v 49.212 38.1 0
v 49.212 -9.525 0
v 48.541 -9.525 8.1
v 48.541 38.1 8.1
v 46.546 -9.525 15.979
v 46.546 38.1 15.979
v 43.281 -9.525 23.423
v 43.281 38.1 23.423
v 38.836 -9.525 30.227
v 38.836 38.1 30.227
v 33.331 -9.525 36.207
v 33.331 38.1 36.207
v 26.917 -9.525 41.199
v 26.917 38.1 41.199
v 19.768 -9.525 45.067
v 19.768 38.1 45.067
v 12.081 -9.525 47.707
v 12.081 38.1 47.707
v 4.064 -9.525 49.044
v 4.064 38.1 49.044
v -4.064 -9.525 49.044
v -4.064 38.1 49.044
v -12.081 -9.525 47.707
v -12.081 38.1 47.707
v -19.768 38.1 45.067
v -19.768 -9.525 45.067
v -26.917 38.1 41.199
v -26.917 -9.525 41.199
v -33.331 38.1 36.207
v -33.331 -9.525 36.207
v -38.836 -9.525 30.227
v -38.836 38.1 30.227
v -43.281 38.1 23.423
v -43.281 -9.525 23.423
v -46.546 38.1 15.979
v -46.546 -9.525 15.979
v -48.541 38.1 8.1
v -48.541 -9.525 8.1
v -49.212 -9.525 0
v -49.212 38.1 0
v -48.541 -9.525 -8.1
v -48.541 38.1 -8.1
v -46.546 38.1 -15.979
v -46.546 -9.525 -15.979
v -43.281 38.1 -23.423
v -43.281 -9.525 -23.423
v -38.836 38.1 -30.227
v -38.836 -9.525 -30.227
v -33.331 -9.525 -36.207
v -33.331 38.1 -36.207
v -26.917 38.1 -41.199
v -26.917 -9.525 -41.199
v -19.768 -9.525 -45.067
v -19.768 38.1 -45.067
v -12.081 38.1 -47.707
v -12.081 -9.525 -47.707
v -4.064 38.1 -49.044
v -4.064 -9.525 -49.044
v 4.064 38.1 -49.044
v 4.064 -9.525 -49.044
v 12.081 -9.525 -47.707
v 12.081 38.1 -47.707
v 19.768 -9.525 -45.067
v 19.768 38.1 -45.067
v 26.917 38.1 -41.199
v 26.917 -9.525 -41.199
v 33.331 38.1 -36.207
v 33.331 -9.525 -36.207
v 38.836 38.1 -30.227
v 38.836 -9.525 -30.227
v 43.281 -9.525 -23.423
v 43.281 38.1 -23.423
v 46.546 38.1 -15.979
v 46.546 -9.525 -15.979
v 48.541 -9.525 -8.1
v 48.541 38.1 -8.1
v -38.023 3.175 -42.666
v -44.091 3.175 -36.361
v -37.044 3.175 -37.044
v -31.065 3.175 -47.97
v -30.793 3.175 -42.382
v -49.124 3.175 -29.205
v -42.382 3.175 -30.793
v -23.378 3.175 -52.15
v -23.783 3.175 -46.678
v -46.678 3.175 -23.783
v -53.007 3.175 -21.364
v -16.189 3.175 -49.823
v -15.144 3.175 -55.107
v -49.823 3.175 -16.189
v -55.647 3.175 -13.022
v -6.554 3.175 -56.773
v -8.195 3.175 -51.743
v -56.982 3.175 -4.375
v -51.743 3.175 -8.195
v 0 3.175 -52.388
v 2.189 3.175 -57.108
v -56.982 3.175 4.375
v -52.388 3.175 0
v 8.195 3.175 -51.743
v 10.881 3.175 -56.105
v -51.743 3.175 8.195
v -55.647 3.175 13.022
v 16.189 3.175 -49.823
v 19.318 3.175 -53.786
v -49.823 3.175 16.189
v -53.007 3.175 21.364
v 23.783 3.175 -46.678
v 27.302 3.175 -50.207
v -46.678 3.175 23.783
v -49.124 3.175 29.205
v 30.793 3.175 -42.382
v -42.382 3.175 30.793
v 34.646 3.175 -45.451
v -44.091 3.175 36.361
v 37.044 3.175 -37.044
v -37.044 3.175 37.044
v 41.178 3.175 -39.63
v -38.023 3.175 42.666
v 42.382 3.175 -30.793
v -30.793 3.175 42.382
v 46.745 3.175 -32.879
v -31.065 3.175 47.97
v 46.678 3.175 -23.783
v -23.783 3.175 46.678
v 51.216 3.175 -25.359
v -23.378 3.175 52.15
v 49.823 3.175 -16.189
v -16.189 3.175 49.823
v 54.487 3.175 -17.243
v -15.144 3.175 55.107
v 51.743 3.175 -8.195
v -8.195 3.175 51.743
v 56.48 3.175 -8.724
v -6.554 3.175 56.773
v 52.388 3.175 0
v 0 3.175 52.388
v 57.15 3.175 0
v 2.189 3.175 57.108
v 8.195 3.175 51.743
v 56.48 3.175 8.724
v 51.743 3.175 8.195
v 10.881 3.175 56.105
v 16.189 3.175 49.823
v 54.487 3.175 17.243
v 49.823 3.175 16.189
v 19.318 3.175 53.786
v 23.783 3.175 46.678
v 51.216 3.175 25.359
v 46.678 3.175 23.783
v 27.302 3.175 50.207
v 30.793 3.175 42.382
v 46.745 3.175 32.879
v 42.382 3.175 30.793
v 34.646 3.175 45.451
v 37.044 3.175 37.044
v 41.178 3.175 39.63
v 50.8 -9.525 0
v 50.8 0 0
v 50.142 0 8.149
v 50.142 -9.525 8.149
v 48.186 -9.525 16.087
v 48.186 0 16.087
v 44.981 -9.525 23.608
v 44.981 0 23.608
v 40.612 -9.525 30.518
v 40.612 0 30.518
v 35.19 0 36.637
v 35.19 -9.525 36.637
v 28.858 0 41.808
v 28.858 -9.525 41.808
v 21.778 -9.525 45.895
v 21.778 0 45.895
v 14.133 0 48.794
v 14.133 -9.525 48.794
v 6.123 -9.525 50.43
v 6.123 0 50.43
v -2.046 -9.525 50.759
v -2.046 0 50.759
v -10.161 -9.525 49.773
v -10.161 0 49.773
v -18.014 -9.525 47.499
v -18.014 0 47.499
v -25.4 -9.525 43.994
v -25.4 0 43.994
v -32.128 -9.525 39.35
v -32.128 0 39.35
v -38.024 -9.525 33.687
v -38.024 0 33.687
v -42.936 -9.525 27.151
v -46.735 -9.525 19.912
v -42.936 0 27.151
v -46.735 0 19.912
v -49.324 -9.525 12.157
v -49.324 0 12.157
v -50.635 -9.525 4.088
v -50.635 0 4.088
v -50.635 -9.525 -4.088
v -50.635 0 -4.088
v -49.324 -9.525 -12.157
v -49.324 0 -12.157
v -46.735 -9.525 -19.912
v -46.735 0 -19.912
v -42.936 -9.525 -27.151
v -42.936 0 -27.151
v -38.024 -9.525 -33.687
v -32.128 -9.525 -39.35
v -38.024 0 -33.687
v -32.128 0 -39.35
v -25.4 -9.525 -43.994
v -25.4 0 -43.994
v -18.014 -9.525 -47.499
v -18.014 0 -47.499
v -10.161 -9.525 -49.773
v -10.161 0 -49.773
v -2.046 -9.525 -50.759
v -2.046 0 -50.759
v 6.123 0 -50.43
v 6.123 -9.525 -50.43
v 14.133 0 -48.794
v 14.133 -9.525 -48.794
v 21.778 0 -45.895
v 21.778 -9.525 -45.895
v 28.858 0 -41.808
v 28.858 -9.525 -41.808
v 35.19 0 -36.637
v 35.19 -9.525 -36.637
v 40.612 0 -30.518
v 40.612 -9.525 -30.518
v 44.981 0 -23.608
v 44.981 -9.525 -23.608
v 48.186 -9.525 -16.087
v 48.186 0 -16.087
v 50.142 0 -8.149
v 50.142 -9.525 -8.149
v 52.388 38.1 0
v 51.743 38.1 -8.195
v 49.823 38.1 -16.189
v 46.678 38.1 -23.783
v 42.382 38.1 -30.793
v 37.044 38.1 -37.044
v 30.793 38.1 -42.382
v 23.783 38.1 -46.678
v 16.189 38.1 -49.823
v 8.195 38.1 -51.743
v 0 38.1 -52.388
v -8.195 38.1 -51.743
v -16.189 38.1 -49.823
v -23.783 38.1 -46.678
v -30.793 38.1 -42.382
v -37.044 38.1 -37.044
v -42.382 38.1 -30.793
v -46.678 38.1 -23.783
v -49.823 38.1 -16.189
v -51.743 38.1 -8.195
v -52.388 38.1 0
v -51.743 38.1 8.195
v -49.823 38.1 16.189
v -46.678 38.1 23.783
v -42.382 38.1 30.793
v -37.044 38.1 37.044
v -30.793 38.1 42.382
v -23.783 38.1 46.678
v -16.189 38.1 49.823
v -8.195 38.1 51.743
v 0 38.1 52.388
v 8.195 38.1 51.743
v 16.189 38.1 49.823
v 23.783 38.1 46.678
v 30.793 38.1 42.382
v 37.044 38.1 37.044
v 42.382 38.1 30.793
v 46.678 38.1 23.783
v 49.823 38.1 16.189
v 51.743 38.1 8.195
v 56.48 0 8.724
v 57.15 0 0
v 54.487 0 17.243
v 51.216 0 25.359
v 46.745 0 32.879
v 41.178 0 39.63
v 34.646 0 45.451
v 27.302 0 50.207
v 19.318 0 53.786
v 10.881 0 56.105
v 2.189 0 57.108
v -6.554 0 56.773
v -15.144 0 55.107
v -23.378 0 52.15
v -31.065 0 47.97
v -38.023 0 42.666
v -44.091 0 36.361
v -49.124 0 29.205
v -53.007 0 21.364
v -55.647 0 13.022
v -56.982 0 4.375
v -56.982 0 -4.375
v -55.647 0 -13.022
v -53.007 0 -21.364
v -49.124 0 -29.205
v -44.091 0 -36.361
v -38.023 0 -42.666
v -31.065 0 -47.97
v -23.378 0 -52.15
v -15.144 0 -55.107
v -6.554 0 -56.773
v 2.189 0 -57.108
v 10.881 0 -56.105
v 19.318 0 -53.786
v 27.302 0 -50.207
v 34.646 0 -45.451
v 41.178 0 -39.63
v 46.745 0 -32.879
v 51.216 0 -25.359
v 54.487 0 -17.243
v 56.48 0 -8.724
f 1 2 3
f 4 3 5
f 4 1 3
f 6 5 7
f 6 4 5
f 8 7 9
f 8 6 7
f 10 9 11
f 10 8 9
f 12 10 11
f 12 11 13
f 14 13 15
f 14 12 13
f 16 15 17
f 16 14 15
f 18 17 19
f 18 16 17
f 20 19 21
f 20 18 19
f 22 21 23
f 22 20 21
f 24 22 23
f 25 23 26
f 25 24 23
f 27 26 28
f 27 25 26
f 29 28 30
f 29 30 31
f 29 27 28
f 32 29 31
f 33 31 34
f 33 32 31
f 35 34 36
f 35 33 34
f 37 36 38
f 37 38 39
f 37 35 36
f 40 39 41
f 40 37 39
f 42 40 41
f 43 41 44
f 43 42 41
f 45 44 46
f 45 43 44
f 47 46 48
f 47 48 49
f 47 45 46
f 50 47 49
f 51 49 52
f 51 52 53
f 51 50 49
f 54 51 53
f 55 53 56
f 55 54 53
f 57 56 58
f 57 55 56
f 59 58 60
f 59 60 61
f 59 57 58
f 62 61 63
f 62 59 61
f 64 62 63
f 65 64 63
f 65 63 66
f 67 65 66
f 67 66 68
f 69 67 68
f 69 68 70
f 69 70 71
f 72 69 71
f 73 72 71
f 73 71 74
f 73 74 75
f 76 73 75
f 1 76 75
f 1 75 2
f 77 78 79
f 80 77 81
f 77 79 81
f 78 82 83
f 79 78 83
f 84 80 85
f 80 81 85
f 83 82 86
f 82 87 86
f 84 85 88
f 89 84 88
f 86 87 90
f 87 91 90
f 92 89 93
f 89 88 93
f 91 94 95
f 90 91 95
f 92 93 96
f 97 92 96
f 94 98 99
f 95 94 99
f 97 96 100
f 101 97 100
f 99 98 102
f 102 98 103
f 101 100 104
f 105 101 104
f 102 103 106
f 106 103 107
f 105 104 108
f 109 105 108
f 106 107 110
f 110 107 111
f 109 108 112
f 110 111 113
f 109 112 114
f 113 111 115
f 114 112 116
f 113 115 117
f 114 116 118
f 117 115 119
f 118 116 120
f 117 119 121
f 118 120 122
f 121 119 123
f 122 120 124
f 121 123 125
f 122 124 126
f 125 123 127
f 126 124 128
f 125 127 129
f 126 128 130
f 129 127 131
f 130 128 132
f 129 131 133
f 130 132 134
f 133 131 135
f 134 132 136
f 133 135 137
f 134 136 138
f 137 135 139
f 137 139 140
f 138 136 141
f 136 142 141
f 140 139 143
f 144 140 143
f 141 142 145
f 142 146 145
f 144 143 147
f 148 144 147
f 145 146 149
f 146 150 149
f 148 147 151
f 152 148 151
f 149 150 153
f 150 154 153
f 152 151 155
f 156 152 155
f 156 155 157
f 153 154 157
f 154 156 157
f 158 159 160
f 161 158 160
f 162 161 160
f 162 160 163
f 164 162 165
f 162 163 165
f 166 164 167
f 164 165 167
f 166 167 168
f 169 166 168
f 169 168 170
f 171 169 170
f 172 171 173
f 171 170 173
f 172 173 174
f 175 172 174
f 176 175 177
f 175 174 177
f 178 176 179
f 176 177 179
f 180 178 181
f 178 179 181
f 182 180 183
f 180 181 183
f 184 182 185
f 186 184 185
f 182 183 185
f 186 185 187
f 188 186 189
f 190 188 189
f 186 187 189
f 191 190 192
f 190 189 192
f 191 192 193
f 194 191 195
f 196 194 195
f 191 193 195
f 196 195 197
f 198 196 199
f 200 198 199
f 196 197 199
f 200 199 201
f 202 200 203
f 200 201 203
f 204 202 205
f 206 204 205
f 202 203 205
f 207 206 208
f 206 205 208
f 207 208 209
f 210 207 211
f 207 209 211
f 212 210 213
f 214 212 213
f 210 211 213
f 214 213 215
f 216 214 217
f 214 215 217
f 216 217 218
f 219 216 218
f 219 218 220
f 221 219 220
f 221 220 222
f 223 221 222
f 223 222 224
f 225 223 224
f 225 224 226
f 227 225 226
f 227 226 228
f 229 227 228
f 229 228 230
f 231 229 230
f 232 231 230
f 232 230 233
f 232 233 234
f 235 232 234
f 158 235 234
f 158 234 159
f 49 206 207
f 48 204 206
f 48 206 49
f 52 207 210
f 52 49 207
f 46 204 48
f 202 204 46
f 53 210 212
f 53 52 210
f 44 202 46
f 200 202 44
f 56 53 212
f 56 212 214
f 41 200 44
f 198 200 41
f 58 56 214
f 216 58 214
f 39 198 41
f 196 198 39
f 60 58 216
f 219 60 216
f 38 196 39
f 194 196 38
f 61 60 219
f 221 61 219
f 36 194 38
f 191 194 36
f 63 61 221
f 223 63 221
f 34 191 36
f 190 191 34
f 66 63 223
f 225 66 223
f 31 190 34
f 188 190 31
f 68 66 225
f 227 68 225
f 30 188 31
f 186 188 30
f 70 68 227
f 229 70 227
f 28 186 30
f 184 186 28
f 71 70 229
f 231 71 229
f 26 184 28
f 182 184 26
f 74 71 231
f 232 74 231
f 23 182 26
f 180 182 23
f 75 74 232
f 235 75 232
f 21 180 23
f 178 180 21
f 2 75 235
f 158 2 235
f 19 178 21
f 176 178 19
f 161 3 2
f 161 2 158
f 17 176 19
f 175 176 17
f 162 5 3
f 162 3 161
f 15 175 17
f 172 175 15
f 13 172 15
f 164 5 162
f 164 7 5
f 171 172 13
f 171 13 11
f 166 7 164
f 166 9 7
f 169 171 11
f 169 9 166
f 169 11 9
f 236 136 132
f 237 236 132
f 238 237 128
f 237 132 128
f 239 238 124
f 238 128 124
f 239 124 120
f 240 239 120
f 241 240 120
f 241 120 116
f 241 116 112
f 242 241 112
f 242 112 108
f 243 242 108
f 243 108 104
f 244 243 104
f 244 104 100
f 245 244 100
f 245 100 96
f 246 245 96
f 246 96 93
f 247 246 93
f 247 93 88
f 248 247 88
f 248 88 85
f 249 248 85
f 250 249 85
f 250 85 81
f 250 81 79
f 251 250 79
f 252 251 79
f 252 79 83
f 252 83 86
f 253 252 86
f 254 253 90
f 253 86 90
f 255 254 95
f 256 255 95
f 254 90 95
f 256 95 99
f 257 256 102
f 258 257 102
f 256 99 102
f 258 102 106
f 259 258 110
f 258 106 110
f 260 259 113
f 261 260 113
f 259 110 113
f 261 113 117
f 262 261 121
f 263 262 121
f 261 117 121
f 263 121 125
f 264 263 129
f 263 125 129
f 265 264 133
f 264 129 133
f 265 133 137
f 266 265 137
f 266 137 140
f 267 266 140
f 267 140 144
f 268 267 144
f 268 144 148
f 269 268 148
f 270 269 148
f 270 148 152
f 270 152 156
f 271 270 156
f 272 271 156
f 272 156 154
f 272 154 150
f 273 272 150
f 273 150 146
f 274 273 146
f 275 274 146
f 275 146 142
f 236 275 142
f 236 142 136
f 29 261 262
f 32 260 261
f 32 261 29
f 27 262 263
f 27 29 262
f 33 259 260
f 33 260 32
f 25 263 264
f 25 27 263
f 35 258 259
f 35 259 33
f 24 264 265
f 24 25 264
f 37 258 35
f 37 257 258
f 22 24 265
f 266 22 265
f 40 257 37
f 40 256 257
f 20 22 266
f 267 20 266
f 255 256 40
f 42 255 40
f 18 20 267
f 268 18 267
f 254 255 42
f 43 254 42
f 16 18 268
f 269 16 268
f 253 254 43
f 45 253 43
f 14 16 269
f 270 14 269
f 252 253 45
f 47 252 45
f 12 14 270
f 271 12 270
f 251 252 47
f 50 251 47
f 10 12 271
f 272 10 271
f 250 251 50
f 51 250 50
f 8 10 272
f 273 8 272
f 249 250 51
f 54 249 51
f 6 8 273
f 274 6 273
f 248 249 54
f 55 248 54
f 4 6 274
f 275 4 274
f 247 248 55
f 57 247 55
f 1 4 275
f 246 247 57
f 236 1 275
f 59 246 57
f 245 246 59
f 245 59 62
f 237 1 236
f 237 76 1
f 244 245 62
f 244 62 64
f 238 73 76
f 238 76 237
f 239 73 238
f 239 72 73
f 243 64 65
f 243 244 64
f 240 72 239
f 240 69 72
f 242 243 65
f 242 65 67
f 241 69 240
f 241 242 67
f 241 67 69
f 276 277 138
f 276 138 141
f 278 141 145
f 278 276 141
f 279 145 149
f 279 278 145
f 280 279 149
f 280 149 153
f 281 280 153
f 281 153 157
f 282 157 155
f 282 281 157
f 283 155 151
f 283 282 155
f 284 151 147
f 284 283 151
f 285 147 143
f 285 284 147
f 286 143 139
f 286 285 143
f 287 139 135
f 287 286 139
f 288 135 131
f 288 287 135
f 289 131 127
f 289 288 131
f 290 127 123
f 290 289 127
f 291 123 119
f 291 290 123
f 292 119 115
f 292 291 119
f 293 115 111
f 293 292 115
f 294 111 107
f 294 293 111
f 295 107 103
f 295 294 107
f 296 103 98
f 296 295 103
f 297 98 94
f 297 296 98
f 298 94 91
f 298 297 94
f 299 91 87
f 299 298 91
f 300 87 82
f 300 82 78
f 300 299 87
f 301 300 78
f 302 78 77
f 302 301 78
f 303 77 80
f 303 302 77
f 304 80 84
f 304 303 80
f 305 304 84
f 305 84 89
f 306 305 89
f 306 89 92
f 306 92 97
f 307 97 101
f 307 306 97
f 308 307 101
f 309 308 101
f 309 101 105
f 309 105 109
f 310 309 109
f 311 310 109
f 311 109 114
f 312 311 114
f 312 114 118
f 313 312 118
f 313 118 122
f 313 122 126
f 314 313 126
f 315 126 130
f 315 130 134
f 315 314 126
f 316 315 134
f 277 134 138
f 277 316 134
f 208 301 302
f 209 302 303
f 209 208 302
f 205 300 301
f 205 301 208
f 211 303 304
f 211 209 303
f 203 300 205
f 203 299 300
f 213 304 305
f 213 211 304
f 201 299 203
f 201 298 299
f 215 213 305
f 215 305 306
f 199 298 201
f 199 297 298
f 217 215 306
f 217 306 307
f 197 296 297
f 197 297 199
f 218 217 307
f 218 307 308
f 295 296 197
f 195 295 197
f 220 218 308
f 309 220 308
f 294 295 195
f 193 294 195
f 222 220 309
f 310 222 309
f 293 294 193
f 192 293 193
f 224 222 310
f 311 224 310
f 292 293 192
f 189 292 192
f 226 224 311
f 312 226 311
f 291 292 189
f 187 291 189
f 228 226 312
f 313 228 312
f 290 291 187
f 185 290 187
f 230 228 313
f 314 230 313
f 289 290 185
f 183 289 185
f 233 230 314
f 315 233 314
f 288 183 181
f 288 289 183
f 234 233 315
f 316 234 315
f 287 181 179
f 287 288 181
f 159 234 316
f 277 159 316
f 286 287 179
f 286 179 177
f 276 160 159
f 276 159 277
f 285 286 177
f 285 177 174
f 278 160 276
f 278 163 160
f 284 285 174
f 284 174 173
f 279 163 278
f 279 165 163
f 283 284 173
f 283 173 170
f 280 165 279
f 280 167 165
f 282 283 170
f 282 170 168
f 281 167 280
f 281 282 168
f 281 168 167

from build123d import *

# Parameters (mm, degrees)
SKETCH1_R           = 52.3875
SKETCH1_R_2         = 49.2125
BOSS_EXTRUDE1_DEPTH = 38.1
SKETCH2_R           = 50.8
SKETCH2_R_2         = 49.2125
BOSS_EXTRUDE2_DEPTH = 9.525
SKETCH3_R           = 57.15
SKETCH3_R_2         = 52.3875
BOSS_EXTRUDE3_DEPTH = 3.175


with BuildPart() as part:
    # Sketch1 → Boss-Extrude1 (new body)
    with BuildSketch(Plane(origin=(0, 0, 0), x_dir=(1, 0, 0), z_dir=(0, 1, 0))):
        Circle(SKETCH1_R)
        Circle(SKETCH1_R_2, mode=Mode.SUBTRACT)
    extrude(amount=BOSS_EXTRUDE1_DEPTH)

    # Sketch2 → Boss-Extrude2 (add)
    with BuildSketch(Plane.XZ):
        Circle(SKETCH2_R)
        Circle(SKETCH2_R_2, mode=Mode.SUBTRACT)
    extrude(amount=BOSS_EXTRUDE2_DEPTH)

    # Sketch3 → Boss-Extrude3 (add)
    with BuildSketch(Plane.XZ):
        Circle(SKETCH3_R)
        Circle(SKETCH3_R_2, mode=Mode.SUBTRACT)
    extrude(amount=-BOSS_EXTRUDE3_DEPTH)


solid = part.part
